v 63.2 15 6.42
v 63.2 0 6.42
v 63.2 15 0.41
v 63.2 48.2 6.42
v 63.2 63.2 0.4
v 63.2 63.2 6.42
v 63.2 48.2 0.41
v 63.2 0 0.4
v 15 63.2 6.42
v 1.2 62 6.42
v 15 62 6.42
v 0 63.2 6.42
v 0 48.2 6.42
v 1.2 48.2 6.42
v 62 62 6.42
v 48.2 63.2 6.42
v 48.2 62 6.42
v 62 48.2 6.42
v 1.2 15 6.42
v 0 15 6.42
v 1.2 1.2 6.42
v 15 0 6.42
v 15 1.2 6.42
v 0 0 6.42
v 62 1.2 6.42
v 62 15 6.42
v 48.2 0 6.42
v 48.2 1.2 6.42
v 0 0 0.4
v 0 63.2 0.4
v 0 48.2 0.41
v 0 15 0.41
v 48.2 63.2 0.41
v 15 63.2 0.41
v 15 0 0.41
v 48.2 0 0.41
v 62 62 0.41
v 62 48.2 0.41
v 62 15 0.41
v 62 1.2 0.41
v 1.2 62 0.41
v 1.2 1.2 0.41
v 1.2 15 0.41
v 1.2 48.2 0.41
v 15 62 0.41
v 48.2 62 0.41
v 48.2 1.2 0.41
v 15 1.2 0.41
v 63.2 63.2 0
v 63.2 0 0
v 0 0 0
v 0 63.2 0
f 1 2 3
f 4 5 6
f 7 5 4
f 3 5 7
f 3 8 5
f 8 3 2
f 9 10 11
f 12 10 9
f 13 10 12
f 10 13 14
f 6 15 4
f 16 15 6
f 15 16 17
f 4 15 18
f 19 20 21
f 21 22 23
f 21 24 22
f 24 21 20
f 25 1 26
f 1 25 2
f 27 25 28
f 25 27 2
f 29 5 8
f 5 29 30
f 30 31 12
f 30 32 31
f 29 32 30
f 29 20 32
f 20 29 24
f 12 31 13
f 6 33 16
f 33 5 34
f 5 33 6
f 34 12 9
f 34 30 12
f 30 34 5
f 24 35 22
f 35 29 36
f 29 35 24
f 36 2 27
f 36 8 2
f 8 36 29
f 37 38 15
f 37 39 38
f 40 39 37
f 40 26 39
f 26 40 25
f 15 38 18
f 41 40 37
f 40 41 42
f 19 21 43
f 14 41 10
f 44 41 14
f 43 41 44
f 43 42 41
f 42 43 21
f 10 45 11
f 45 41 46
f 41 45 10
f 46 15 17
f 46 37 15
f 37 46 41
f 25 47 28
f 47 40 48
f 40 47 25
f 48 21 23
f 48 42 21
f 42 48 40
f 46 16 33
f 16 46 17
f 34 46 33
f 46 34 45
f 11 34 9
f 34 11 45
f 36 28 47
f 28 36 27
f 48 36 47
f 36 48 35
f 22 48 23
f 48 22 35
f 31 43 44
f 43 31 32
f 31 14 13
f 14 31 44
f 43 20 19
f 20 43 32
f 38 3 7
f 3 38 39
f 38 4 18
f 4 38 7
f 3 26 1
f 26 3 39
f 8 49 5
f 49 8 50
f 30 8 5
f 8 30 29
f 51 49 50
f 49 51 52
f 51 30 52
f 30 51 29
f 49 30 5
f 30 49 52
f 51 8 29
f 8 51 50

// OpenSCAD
// file: ../../Base/Rotation.scad
// Fischertechnik Box Foundation
// Geometry Helpers Rotation

include <PlacementOptions.scad>

// getRotatedSpace(space, rotation=NoRotation)
// Rotates the space dependent on the specified rotation

function getRotatedSpace(space, rotation=NoRotation) = [
    (rotation == Rotate90 || rotation == Rotate270) ? space.y : space.x,
    (rotation == Rotate90 || rotation == Rotate270) ? space.x : space.y
];

// Rotates the given space around the fixed left lower corner
// space = the space the children needs as width/depth list [width,depth]
// rotation = 0 Rotate0 degrees, 1 Rotate90 degrees, 2 Rotate180 degrees, 3 Rotate270 degrees (equivalent to -90)

module RotateFix(space, rotation=NoRotation) {
    dy = (rotation == Rotate0 || rotation == Rotate270) ? 0 :
        (rotation == Rotate90) ? space.x :
        space.y;
    dx = (rotation < Rotate180) ? 0 :
        (rotation == Rotate180) ? space.x :
        space.y;
    
    translate([dx, dy, 0])
        rotate([0, 0, rotations[rotation]])
            children();
}
// file: ../../Base/Alignment.scad
// Fischertechnik Box Foundation
// Geometry Helpers Alignment

include <PlacementOptions.scad>

// getAlignedX(elementWidth, spaceWidth, align=AlignRight, offset=0)
// Gets the aligned X offset of an element with the given
// width in the given space.
// elementWidth = The width of the element to positon
// spaceWidth = The space where the element should be aligned
// align = 0 AlignLeft, 1 AlignCenter, 2 AlignRight
// offset = an optional offset from the aligned position. When
// aligned left or centered, then positive values are in X direction.
// When aligned right then positive values are in negative X direction.

function getAlignedX(elementWidth, spaceWidth, align=AlignRight, offset=0) =
    (align == AlignLeft) ?
        offset :
        ((align == AlignCenter) ?
        (spaceWidth - elementWidth)/2 + offset :
        spaceWidth - offset - elementWidth);

// getAlignedY(elementDepth, spaceDepth, align=AlignTop, offset=0)
// Gets the aligned Y offset of an element with the given
// depth in the given space.
// elementDepth = The depth of the element to positon
// spaceDepth = The space where the element should be aligned
// align = 0 AlignBottom, 1 AlignCenter, 2 AlignTop
// offset = an optional offset from the aligned position. When
// aligned bottom or centered, then positive values are in Y direction.
// When aligned top then positive values are in negative Y direction.

function getAlignedY(elementDepth, spaceDepth, align=AlignTop, offset=0) =
    (align == AlignBottom) ?
        offset :
        ((align == AlignCenter) ?
        (spaceDepth - elementDepth)/2 + offset :
        spaceDepth - offset - elementDepth);
// file: ../../Base/Boxes.scad
// Fischertechnik Box Foundation
// Pre-designed Boxes

use <Constants.scad>

include <PlacementOptions.scad>

box190Width = 190;
box190Depth = 130;
box130Width = 130;
box130Depth = 95;

// Values are from an original ec3 box
topBottomDifference = 1.5;
outerHeight = 40;
innerHeight = 38.2;
baseThickness = outerHeight - innerHeight;
stackExcess = 5.7;
radius = 3.5;
wallThickness = 1.5;
tolerance = 0.2;
stackOffset = innerHeight - stackExcess;

boxUsageHeight = stackOffset;
boxWallThickness = wallThickness;
boxBaseThickness = baseThickness;
boxWebWidth = 3.0;

// getBoxWallThickness()
// Gets the wall thickness of a Fischertechnik Box
function getBoxWallThickness() = boxWallThickness;

// getBoxUsageHeight()
// Gets the usable height of a Fischertechnik box
function getBoxUsageHeight() = boxUsageHeight;

// getBoxInnerHeight()
// Gets the inner height of a Fischertechnik box, including the stack excess
function getBoxInnerHeight() = innerHeight;

// getBoxBaseThickness()
// Gets the thickness of the Fischertechnik box base.
function getBoxBaseThickness() = boxBaseThickness;

// getBoxWebWidth()
// Gets the width of a box web
function getBoxWebWidth() = boxWebWidth;

// getBox190Space()
// Gets the usable inner space of a Box 190 as an x/y-list
function getBox190Space() = [
    box190Width - 2*getBoxWallThickness() - topBottomDifference, 
    box190Depth - 2*getBoxWallThickness() - topBottomDifference ];

// BoxBase(width, depth)
// Creates an empty stackable Fischertechnik compatible box
// width = Outer width of the box (190, 130, ...)
// depth = Outer depth of the box (130, 95, ...)

module BoxBase(width, depth, height=outerHeight) {    
    thinPlate = 0.01;

    innerHeight = height - baseThickness;    
    
    module BodyPlate(width, depth) {
        translate([radius, radius])
        hull() {
            w = width-2*radius;
            d = depth-2*radius;
            cube([w, d, thinPlate]);
            cylinder(thinPlate, r=radius, $fn=getFragments());
            translate([w, 0])
                cylinder(thinPlate, r=radius, $fn=getFragments());
            translate([w, d])
                cylinder(thinPlate, r=radius, $fn=getFragments());
            translate([0, d])
                cylinder(thinPlate, r=radius, $fn=getFragments());
        }
    }
    
    module Body(tolerance=tolerance) {
        hull() {
            // Bottom with tolerance to fit into the original boxes when stacked
            translate([-wallThickness+tolerance, -wallThickness+tolerance, -baseThickness])
                BodyPlate(width-topBottomDifference-2*tolerance, depth-topBottomDifference-2*tolerance);
            
            // Top
            translate([-wallThickness-topBottomDifference/2, -wallThickness-topBottomDifference/2, innerHeight-thinPlate])
                BodyPlate(width, depth);
         }
    }

    module Cutoff() {
        hull() {
            coWidth = width - 2*wallThickness;
            coDepth = depth - 2*wallThickness;
            
            // Bottom
            BodyPlate(coWidth-topBottomDifference, coDepth-topBottomDifference);

            // Top
            translate([-topBottomDifference/2, -topBottomDifference/2, innerHeight+thinPlate]) 
                BodyPlate(coWidth, coDepth);
        }
    }
    
    difference() {        
        Body();
        Cutoff();
        stackOffset = innerHeight - stackExcess;
        translate([0, 0, stackOffset + baseThickness])
            Body(tolerance=0);
    }
}

// Creates the Fischertechnik empty box 130x190 mm and places it at position 0,0
// 190x130 are the outer sizes, the inner space is slightly smaller. Use getBox190Space() to get the inner sizes.
// The box is positioned that the usable inner space is at the 0,0,0 position. The

module Box190() {
    BoxBase(box190Width, box190Depth);
}

// Gets the usable inner space of a Box 130 as an x/y-list
function getBox130Space() = [
    box130Width - 2*getBoxWallThickness() - topBottomDifference, 
    box130Depth - 2*getBoxWallThickness() - topBottomDifference ];

// Creates the Fischertechnik empty box 95x130 mm and places it at position 0,0
// 190x130 are the outer sizes, the inner space is slightly smaller. Use getBox190Space() to get the inner sizes.
// The box is positioned that the usable inner space is at the 0,0,0 position. The

module Box130() {
    BoxBase(box130Width, box130Depth);
}

// Creates a web at the specified box walls
// corner 0 = LowerLeft, 1 = UpperLeft, 2 = UpperRight, 3 = LowerRight
// side 0 = LeftOfCorner, 1 = RightOfCorner
// distance = Distance in mm from the corner
// boxSpace = inner width and depth of the box (default: Box 190)
// webWidth = length of the web (default is 3 mms)
// webThickness = thickness of the web (default is 1 mm)

module BoxWeb(corner, side, distance, boxSpace=getBox190Space(), webWidth=getBoxWebWidth(), webThickness=1.0) {
    sink = getBoxWallThickness()/2;

    width = (corner % 2 == 0) ? 
            (side == LeftOfCorner ? webWidth : webThickness) :
            (side == LeftOfCorner ? webThickness : webWidth);

    depth = (corner % 2 == 0) ? 
            (side == RightOfCorner ? webWidth : webThickness) :
            (side == RightOfCorner ? webThickness : webWidth);
    
    xDiff = corner == LowerLeft ? 
                (side == LeftOfCorner ? -sink : distance) :
            (corner == UpperLeft ?                
                (side == LeftOfCorner ? distance : -sink) :
            (corner == UpperRight ?
                (side == LeftOfCorner ? boxSpace.x-webWidth+sink : boxSpace.x-distance-webThickness) :
                (side == LeftOfCorner ? boxSpace.x-distance-webThickness: boxSpace.x-webWidth+sink)));

    yDiff = corner == LowerLeft ? 
                (side == RightOfCorner ? -sink : distance) :
            (corner == UpperLeft ?
                (side == RightOfCorner ? boxSpace.y-distance : boxSpace.y-webWidth+sink) :
            (corner == UpperRight ?
                (side == RightOfCorner ? boxSpace.y-webWidth+sink : boxSpace.y-distance) :
                (side == RightOfCorner ? distance : -sink)));
    
    translate([xDiff, yDiff, -getExcess()])
        cube([width, depth, boxUsageHeight + 2*getExcess()]);
}
// file: ../../Base/Placement.scad
// Fischertechnik Box Foundation
// Geometry Helpers Placement

use <Constants.scad>
use <Alignment.scad>
use <Rotation.scad>
use <Boxes.scad>

include <PlacementOptions.scad>

// Place(x=0, y=0, elementSpace=[0,0], alignX=AlignLeft, alignY=AlignBottom, rotation=Rotate0, boxSpace=getBox190Space())
// Places the child at the specified position
// y = Y-Position. This is a relative position when an X aligment is specified.
// x = X-Position. This is a relative position when an Y aligment is specified.
// elementSpace = space of the element to be placed [x,y]
// alignX = -1=NoAlign, 0 AlignLeft, 1 AlignCenter, 3 AlignRight (elementSpace and boxSpace required!)
// alignY = -1=NoAlign, 2 AlignBottom, 1 AlignCenter, 4 AlignTop (elementSpace and boxSpace required!)
// rotation = 0 Rotate0 0 degrees, 1 Rotate90 90 degrees, 
// 2 Rotate180 180 degrees, 3 Rotate270 270 degrees (equivalent to -90)
// boxSpace = Inner space of the box where the placement occurs [x,y] - default is Box 190x130 inner space

module Place(x=0, y=0, elementSpace=[0,0], 
  alignX=AlignLeft, alignY=AlignBottom, 
  rotation=NoRotation, boxSpace=getBox190Space()) {

    module Position(x, y, space, rotation=Rotate0) {
        translate([x, y, 0])
            RotateFix(space, rotation)
                children();
    }

    space = getRotatedSpace(elementSpace, rotation);
    alignedX = getAlignedX(space.x, boxSpace.x, alignX, x);
    alignedY = getAlignedY(space.y, boxSpace.y, alignY, y);
    Position(alignedX, alignedY, elementSpace, rotation)
        children();
}

// Center(space=getBox130Space(), elementSpace=[0,0])
// space = Space where the children is centered. For cylinder use centered=true and no elementSpace.
// elementSpace = space of the element to be centered [x,y]

module Center(space=getBox190Space(), elementSpace=[0,0]) {
    Place(elementSpace=elementSpace, boxSpace=space, alignX=AlignCenter, alignY=AlignCenter)
        children();
}

// CenterHorizontal(width=0, y=0, offset=0, space=getBox130Space())
// width = Width of the element to be placed.
// y = Y position of the element
// offset = Offset from the center position (negative will be left of the center)
// space = Space where the element is placed

module CenterHorizontal(width=0, y=0, offset=0, space=getBox190Space()) {
    Place(x=offset, y=y, elementSpace=[width, 0], boxSpace=space, alignX=AlignCenter)
        children(0);
}

// CenterVertical(depth=0, x=0, offset=0, space=getBox130Space())
// depth = Depth of the element to be placed.
// x = X position of the element
// offset = Offset from the center position (negative will be down of the center)
// space = Space where the element is placed

module CenterVertical(depth=0, x=0, offset=0, space=getBox190Space()) {
    Place(x=x, y=offset, elementSpace=[0, depth], boxSpace=space, alignY=AlignCenter)
        children(0);
}

// getIsVertical(align)
// True if the specified alignment needs a vertical orientation for a divider (AlignRight, AlignLeft)

function getIsVertical(align) = (align == AlignRight || align == AlignLeft);

// getIsHorizontal(align)
// True if the specified alignment needs a horizontal orientation for a divider (AlignTop, AlignBottom)

function getIsHorizontal(align) = (align == AlignTop || align == AlignBottom);
// file: ../../Base/PlacementOptions.scad
// Fischertechnik Box Foundation
// Placement Options

// Alignment
NoAlign = 0;
AlignLeft = 1;
AlignBottom = 2;
AlignCenter = 3;
AlignRight = 4;
AlignTop = 5;

// Element rotation degree steps
rotations = [0, -90, -180, -270];

// Rotation
NoRotation = 0;
Rotate0 = 0;
Rotate90 = 1;
Rotate180 = 2;
Rotate270 = 3;

// Docking (seen from above)
NoDock = -1;
DockLeft = 0;
DockTop = 1;
DockRight = 2;
DockCorner = 2;
DockBottom = 3;

// Web corners
LowerLeft = 0;
UpperLeft = 1;
UpperRight = 2;
LowerRight = 3;

// Web position relative to corner
LeftOfCorner = 0;
RightOfCorner = 1;
// file: ../../Elements/AxisClip10.scad
// Fischertechnik Box Library
// Axis for clip 10
// 31023

use <../ModelBase/Simple.scad>
use <../Base/Constants.scad>

width = 12;
depth = 12;
height = 23;
upperDiameter = 3.6;
clipHeight = 10;

// getAxisClip10Space()
// Gets the space of a frame for a clip 10 with spring ring (mot2)

function getAxisClip10Space() = [width, depth, height];

// AxisClip10(height, clipHeight)
// Axis for clip 10 with spring ring (mot2)
// height = Height of the complete axis
// clipHeight = Height of the rt for the clip (standard is 10, in mot3 its only 7)

module AxisClip10(height=height, clipHeight=clipHeight) {
    LeveledAxisWithSpace(height, height-clipHeight, getAxisClip10Space(), diameter=upperDiameter);
}

// Tests
color("lightgray")
AxisClip10();
// file: ../../Base/Constants.scad
// Fischertechnik Box Foundation
// Constants

// Constant values necessary for multiple elements

// Base constants
dividerThickness = 1.2;
excess = 0.01;
fragments = 90;
tolerance = 0.8;

// Gets the thickness of a divider 
function getDividerThickness() = dividerThickness;

// Gets the excess that is used to merge walls into each other
function getExcess() = excess;

// Gets amount of fragments of a cylinder
function getFragments() = fragments;

// Gets the inner tolerance of a frame to each side
function getTolerance() = tolerance;


// Fischertechnik specific constants
axisDiameter = 4;
axisBottomDiameter = axisDiameter + 1;
standardEdgeDistance = 2.5;
standardWebDistance = 11.5;
standardCornerLength = 15;
tubeWallFactor = 0.8;
smallPartsFrameHeight = 20;

// Gets axis diameter
function getAxisDiameter() = axisDiameter;

// Gets axis bottom diameter for thicker part at the bottom
function getAxisBottomDiameter() = axisBottomDiameter;

// gets the standard distance to the wall of the box for dockable frames with webs
function getStandardEdgeDistance() = standardEdgeDistance;

// gets the standard distance of each web to the corner of the dockable frame
function getStandardWebDistance() = standardWebDistance;

// gets the standard length of the corner walls of a dockable frame
function getStandardCornerLength() = standardCornerLength;

// gets the wall thickness of a tube.
function getTubeWallThickness() = tubeWallFactor * getDividerThickness();

// gets the frame height for docked small parts boxes.
function getSmallPartsFrameHeight() = smallPartsFrameHeight;
// file: ../../Elements/FrameCassette.scad
// Fischertechnik Box Library
// Frame for Cassette or Rechargeable Battery Pack
// 36518, 35537

use <../Base/Constants.scad>
use <../ModelBase/Simple.scad>
use <../ModelBase/Complex.scad>

include <../Base/PlacementOptions.scad>

width = 60;
depth = 60;
height = 6;


// getFrameCassetteSpace(alignX, alignY)
// alignX 0=NoAlign 1=AlignLeft 3=AlignCenter 4=AlignRight 
// alignY 0=AlignNo 2=AlignBottom 3=AlignCenter 5=AlignTop
// Gets the space the frame for a cassette needs as width and depth(.x and .y as a list). 

function getFrameCassetteSpace(alignX=NoAlign, alignY=NoAlign) = 
    getDockableEdgedFrameSpace([width, depth, height], alignX, alignY);

// FrameCassette(alignX, alignY)
// Frame for cassette.
// alignX 0=NoAlign 1=AlignLeft 3=AlignCenter 4=AlignRight 
// alignY 0=AlignNo 2=AlignBottom 3=AlignCenter 5=AlignTop

module FrameCassette(alignX=NoAlign, alignY=NoAlign) {
    DockableEdgedFrame([width, depth, height], alignX, alignY);
}

// Test
color("lightgray") {
    FrameCassette();
}
// file: ../TestPrint.scad
// 3D Print Test Base

use <../Base/Constants.scad>

use <../Elements/AxisClip10.scad>

module TestPrint(elementSpace) {
    cube([elementSpace.x, elementSpace.y, 0.4]);
    translate([0,0,0.4+getExcess()]) {
        children();
    }
}

TestPrint(getAxisClip10Space())
    AxisClip10();
// main file
// 3D Print Test
// FrameCassette

use <../TestPrint.scad>
use <../../Elements/FrameCassette.scad>

TestPrint(getFrameCassetteSpace())
    FrameCassette();
